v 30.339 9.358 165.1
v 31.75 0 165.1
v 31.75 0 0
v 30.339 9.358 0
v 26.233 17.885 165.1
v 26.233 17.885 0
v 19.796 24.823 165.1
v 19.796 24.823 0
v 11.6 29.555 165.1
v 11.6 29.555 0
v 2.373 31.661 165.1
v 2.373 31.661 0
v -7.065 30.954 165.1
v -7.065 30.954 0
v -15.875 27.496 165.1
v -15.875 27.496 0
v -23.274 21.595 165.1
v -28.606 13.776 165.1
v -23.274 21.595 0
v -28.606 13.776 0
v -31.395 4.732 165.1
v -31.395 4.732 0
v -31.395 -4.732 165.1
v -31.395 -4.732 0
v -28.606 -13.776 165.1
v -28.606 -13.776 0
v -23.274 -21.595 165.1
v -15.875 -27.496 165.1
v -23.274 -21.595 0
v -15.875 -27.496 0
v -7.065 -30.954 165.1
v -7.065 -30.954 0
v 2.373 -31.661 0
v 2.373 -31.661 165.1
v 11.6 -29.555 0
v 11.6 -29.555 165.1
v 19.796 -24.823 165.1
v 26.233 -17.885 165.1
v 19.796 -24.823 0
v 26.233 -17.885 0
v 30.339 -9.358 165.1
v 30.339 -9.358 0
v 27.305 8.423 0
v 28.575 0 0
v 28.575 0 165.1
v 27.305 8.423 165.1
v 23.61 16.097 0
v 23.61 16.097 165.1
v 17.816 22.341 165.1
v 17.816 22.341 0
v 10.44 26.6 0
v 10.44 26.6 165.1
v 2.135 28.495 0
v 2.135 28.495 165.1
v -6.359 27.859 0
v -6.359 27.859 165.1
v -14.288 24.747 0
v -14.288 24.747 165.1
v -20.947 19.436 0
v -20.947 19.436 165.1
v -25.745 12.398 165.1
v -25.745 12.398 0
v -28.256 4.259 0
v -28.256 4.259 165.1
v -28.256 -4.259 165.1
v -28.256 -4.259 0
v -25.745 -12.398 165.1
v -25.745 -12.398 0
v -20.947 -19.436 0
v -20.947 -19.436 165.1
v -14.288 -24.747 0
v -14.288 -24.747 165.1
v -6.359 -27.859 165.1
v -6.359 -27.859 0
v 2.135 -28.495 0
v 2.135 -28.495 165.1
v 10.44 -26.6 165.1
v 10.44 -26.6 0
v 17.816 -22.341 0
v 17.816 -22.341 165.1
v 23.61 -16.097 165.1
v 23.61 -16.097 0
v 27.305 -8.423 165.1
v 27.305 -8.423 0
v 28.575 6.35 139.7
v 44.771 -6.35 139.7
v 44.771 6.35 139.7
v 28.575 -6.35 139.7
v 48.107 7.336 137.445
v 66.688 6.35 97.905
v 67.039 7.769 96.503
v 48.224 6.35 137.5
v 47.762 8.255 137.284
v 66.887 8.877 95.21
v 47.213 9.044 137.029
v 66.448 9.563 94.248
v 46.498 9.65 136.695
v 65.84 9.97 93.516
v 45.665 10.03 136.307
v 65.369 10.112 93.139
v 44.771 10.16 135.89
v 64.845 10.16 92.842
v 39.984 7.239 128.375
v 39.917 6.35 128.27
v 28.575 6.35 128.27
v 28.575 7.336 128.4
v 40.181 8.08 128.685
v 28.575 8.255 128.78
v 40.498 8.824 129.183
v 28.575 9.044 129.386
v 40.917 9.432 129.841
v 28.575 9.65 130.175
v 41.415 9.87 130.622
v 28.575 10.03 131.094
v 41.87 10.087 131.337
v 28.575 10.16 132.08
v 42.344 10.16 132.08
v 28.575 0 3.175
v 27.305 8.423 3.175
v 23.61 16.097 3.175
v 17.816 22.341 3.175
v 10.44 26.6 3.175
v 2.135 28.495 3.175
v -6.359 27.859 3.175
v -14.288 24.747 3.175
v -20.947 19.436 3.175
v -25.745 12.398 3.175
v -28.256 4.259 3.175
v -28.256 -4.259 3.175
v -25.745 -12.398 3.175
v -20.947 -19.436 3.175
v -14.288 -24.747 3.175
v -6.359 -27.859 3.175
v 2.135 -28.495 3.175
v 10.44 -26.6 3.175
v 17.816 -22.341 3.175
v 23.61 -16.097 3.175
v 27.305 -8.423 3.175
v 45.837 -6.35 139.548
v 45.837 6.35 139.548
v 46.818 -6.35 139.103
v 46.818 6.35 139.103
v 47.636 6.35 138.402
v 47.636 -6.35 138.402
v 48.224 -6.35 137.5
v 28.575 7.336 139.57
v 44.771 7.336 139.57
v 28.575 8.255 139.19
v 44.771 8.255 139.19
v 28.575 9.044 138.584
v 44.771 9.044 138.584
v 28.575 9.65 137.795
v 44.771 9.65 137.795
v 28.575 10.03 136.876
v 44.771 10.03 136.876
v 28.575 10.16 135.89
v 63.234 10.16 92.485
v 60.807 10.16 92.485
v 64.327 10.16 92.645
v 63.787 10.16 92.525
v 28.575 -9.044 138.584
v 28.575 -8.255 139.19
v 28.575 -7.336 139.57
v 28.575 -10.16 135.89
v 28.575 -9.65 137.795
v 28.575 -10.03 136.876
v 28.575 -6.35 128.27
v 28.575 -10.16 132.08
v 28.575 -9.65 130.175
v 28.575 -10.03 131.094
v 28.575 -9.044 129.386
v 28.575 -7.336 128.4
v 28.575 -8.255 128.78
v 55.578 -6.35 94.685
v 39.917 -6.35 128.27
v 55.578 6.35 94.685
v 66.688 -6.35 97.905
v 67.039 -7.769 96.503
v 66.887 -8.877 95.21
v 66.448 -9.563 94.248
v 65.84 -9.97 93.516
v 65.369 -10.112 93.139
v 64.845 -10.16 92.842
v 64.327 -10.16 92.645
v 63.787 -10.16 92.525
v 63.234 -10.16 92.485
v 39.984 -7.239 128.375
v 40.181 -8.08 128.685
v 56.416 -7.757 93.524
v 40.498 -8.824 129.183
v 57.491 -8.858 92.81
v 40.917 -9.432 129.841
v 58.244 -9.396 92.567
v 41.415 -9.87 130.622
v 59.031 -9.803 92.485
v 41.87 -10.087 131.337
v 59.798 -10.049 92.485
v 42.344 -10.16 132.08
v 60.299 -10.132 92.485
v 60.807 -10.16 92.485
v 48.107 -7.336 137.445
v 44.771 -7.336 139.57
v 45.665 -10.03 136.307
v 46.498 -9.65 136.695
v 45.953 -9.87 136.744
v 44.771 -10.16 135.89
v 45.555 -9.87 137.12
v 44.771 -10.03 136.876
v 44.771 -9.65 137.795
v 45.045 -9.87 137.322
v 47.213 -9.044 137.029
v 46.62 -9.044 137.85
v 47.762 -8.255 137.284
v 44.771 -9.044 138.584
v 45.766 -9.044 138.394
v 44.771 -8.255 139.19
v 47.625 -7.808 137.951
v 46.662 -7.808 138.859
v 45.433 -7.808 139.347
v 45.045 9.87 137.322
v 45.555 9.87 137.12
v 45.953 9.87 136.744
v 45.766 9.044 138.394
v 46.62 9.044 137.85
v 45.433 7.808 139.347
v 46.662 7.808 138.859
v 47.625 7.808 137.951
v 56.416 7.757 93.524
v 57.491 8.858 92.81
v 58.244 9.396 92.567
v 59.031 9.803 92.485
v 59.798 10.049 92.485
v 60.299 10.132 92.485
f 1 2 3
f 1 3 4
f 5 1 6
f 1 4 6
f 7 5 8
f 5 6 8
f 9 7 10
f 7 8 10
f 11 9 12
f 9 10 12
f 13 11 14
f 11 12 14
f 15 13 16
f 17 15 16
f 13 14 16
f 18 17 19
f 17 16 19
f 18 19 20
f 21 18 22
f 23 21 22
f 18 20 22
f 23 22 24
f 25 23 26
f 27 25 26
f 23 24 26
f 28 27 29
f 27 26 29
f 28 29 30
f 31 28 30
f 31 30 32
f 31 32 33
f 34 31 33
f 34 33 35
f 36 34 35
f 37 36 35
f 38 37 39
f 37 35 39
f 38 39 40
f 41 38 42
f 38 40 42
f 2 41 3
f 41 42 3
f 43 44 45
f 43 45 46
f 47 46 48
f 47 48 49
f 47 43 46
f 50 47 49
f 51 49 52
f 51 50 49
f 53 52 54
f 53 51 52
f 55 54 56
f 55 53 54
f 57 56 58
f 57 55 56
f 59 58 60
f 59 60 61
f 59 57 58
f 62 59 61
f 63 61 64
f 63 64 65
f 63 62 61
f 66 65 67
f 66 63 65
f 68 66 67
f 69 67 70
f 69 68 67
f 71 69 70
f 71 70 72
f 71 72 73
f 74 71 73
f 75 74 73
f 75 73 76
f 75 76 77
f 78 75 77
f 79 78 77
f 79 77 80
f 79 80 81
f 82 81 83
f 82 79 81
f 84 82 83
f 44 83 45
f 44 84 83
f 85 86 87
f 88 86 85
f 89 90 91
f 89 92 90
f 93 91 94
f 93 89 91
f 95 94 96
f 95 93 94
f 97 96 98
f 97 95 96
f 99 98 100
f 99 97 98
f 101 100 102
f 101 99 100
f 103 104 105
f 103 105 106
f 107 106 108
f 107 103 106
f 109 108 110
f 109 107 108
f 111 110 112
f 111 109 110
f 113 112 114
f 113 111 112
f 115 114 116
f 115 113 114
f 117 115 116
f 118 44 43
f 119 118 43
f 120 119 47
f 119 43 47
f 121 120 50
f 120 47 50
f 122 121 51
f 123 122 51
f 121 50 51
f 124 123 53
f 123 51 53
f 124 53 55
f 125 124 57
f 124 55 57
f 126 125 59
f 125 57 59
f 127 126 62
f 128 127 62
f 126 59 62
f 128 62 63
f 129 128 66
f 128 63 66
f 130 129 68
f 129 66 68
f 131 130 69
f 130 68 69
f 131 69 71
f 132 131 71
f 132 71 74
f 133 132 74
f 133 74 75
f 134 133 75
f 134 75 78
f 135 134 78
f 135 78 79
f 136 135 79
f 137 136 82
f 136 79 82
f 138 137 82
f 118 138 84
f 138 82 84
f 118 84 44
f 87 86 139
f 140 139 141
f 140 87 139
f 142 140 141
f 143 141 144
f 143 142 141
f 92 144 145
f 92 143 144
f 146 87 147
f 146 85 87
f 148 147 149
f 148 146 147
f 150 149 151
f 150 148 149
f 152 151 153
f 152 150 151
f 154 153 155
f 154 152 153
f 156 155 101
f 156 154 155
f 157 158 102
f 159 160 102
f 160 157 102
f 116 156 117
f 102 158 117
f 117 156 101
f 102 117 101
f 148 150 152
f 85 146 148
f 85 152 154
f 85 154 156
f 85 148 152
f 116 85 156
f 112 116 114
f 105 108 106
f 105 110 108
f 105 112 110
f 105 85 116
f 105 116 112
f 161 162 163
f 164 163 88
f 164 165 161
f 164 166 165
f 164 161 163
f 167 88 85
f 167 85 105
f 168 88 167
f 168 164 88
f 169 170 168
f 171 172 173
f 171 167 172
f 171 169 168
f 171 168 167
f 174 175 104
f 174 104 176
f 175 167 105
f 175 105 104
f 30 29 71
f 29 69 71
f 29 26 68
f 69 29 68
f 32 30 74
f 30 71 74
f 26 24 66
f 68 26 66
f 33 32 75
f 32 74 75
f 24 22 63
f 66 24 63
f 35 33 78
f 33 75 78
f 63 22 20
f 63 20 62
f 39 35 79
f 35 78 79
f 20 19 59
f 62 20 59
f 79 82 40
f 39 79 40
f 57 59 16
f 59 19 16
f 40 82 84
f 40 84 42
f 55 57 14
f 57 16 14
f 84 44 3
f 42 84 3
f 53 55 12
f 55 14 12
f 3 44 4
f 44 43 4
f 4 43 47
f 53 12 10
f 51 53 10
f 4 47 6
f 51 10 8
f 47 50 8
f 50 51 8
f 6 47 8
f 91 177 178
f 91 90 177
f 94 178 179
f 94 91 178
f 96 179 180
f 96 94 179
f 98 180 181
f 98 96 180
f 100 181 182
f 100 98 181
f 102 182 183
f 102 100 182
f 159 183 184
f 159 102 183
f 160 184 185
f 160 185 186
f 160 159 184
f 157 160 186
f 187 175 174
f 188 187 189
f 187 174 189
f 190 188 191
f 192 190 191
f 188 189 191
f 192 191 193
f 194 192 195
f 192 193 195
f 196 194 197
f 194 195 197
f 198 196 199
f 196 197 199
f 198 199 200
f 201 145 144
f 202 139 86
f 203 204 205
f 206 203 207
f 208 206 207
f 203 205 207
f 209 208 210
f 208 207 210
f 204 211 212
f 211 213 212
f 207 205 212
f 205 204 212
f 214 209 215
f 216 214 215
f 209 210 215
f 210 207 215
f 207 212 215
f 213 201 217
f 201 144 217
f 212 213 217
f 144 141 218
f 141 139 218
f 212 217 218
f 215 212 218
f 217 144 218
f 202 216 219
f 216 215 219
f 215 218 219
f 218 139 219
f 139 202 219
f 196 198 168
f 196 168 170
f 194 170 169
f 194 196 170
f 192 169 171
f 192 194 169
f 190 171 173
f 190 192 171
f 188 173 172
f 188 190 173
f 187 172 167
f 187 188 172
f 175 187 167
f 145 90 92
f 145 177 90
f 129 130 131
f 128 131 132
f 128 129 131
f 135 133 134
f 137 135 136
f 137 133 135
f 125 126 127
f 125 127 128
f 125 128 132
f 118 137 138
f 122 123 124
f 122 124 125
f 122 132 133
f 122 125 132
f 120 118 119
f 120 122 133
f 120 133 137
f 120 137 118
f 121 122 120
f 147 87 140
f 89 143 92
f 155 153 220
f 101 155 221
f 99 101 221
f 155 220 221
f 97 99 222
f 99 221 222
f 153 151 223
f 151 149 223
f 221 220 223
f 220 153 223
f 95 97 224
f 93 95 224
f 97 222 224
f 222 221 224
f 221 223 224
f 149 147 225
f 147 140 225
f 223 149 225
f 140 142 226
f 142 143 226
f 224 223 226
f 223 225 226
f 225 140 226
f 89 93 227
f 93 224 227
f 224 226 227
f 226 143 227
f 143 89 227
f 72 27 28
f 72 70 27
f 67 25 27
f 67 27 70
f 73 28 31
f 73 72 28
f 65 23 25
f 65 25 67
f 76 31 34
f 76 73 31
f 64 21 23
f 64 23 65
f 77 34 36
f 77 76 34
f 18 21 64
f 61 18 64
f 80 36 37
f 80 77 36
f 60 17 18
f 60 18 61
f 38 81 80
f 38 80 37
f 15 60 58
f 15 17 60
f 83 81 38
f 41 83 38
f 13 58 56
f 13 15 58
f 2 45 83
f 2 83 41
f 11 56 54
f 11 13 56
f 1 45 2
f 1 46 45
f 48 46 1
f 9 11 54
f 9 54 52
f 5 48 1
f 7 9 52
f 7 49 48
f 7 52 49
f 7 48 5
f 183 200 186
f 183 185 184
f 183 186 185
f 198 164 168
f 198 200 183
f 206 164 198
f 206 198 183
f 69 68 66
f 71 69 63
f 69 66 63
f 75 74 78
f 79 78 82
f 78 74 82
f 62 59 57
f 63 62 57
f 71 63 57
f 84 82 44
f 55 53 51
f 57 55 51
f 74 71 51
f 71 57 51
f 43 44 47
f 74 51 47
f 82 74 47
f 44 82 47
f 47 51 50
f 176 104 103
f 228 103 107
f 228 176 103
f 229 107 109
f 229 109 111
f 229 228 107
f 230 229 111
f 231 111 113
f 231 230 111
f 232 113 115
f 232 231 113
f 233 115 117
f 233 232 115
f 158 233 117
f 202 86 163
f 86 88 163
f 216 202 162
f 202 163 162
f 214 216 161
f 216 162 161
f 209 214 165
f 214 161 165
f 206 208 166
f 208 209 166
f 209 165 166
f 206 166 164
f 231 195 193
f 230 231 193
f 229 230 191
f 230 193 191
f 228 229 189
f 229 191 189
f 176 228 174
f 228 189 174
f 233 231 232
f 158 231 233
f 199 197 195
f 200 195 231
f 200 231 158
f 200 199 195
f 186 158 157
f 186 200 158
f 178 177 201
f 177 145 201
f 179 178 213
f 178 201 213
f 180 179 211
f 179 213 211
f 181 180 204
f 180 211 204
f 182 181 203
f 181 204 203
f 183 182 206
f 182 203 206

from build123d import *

# Parameters (mm, degrees)
F0_R     = 28.575
F2_DEPTH = 3.175
F0_R_2   = 31.75
F3_DEPTH = 165.1
F4_DEPTH = 10.16
F5_R     = 3.81


with BuildPart() as f2:
    # F0 (on Top) → F2 (new body)
    with BuildSketch(Plane.XY):
        Circle(F0_R)
    extrude(amount=F2_DEPTH)


with BuildPart() as f3:
    # F0 (on Top) → F3 (new body)
    with BuildSketch(Plane.XY):
        Circle(F0_R_2)
        Circle(F0_R, mode=Mode.SUBTRACT)
    extrude(amount=F3_DEPTH)


with BuildPart() as f4:
    # F1 (on Front) → F4 (new body, symmetric)
    with BuildSketch(Plane.XZ):
        Polygon((28.575, 139.7), (28.575, 128.27), (39.916662, 128.27), (56.60339, 92.485196), (69.215, 92.485196), (47.198375, 139.7), align=None)
    extrude(amount=F4_DEPTH, both=True)

    # F5
    f5_edges = [f4.edges().sort_by_distance(p)[0] for p in [
        (58.206688, 10.16, 116.092598),
        (47.198375, 0, 139.7),
        (58.206688, -10.16, 116.092598),
        (69.215, 0, 92.485196),
        (56.60339, 0, 92.485196),
        (48.260026, 10.16, 110.377598),
        (34.245831, 10.16, 128.27),
        (37.886688, 10.16, 139.7),
        (48.260026, -10.16, 110.377598),
        (34.245831, -10.16, 128.27),
        (37.886688, -10.16, 139.7),
    ]]
    fillet(f5_edges, radius=F5_R)


solid = Compound([f2.part, f3.part, f4.part])
